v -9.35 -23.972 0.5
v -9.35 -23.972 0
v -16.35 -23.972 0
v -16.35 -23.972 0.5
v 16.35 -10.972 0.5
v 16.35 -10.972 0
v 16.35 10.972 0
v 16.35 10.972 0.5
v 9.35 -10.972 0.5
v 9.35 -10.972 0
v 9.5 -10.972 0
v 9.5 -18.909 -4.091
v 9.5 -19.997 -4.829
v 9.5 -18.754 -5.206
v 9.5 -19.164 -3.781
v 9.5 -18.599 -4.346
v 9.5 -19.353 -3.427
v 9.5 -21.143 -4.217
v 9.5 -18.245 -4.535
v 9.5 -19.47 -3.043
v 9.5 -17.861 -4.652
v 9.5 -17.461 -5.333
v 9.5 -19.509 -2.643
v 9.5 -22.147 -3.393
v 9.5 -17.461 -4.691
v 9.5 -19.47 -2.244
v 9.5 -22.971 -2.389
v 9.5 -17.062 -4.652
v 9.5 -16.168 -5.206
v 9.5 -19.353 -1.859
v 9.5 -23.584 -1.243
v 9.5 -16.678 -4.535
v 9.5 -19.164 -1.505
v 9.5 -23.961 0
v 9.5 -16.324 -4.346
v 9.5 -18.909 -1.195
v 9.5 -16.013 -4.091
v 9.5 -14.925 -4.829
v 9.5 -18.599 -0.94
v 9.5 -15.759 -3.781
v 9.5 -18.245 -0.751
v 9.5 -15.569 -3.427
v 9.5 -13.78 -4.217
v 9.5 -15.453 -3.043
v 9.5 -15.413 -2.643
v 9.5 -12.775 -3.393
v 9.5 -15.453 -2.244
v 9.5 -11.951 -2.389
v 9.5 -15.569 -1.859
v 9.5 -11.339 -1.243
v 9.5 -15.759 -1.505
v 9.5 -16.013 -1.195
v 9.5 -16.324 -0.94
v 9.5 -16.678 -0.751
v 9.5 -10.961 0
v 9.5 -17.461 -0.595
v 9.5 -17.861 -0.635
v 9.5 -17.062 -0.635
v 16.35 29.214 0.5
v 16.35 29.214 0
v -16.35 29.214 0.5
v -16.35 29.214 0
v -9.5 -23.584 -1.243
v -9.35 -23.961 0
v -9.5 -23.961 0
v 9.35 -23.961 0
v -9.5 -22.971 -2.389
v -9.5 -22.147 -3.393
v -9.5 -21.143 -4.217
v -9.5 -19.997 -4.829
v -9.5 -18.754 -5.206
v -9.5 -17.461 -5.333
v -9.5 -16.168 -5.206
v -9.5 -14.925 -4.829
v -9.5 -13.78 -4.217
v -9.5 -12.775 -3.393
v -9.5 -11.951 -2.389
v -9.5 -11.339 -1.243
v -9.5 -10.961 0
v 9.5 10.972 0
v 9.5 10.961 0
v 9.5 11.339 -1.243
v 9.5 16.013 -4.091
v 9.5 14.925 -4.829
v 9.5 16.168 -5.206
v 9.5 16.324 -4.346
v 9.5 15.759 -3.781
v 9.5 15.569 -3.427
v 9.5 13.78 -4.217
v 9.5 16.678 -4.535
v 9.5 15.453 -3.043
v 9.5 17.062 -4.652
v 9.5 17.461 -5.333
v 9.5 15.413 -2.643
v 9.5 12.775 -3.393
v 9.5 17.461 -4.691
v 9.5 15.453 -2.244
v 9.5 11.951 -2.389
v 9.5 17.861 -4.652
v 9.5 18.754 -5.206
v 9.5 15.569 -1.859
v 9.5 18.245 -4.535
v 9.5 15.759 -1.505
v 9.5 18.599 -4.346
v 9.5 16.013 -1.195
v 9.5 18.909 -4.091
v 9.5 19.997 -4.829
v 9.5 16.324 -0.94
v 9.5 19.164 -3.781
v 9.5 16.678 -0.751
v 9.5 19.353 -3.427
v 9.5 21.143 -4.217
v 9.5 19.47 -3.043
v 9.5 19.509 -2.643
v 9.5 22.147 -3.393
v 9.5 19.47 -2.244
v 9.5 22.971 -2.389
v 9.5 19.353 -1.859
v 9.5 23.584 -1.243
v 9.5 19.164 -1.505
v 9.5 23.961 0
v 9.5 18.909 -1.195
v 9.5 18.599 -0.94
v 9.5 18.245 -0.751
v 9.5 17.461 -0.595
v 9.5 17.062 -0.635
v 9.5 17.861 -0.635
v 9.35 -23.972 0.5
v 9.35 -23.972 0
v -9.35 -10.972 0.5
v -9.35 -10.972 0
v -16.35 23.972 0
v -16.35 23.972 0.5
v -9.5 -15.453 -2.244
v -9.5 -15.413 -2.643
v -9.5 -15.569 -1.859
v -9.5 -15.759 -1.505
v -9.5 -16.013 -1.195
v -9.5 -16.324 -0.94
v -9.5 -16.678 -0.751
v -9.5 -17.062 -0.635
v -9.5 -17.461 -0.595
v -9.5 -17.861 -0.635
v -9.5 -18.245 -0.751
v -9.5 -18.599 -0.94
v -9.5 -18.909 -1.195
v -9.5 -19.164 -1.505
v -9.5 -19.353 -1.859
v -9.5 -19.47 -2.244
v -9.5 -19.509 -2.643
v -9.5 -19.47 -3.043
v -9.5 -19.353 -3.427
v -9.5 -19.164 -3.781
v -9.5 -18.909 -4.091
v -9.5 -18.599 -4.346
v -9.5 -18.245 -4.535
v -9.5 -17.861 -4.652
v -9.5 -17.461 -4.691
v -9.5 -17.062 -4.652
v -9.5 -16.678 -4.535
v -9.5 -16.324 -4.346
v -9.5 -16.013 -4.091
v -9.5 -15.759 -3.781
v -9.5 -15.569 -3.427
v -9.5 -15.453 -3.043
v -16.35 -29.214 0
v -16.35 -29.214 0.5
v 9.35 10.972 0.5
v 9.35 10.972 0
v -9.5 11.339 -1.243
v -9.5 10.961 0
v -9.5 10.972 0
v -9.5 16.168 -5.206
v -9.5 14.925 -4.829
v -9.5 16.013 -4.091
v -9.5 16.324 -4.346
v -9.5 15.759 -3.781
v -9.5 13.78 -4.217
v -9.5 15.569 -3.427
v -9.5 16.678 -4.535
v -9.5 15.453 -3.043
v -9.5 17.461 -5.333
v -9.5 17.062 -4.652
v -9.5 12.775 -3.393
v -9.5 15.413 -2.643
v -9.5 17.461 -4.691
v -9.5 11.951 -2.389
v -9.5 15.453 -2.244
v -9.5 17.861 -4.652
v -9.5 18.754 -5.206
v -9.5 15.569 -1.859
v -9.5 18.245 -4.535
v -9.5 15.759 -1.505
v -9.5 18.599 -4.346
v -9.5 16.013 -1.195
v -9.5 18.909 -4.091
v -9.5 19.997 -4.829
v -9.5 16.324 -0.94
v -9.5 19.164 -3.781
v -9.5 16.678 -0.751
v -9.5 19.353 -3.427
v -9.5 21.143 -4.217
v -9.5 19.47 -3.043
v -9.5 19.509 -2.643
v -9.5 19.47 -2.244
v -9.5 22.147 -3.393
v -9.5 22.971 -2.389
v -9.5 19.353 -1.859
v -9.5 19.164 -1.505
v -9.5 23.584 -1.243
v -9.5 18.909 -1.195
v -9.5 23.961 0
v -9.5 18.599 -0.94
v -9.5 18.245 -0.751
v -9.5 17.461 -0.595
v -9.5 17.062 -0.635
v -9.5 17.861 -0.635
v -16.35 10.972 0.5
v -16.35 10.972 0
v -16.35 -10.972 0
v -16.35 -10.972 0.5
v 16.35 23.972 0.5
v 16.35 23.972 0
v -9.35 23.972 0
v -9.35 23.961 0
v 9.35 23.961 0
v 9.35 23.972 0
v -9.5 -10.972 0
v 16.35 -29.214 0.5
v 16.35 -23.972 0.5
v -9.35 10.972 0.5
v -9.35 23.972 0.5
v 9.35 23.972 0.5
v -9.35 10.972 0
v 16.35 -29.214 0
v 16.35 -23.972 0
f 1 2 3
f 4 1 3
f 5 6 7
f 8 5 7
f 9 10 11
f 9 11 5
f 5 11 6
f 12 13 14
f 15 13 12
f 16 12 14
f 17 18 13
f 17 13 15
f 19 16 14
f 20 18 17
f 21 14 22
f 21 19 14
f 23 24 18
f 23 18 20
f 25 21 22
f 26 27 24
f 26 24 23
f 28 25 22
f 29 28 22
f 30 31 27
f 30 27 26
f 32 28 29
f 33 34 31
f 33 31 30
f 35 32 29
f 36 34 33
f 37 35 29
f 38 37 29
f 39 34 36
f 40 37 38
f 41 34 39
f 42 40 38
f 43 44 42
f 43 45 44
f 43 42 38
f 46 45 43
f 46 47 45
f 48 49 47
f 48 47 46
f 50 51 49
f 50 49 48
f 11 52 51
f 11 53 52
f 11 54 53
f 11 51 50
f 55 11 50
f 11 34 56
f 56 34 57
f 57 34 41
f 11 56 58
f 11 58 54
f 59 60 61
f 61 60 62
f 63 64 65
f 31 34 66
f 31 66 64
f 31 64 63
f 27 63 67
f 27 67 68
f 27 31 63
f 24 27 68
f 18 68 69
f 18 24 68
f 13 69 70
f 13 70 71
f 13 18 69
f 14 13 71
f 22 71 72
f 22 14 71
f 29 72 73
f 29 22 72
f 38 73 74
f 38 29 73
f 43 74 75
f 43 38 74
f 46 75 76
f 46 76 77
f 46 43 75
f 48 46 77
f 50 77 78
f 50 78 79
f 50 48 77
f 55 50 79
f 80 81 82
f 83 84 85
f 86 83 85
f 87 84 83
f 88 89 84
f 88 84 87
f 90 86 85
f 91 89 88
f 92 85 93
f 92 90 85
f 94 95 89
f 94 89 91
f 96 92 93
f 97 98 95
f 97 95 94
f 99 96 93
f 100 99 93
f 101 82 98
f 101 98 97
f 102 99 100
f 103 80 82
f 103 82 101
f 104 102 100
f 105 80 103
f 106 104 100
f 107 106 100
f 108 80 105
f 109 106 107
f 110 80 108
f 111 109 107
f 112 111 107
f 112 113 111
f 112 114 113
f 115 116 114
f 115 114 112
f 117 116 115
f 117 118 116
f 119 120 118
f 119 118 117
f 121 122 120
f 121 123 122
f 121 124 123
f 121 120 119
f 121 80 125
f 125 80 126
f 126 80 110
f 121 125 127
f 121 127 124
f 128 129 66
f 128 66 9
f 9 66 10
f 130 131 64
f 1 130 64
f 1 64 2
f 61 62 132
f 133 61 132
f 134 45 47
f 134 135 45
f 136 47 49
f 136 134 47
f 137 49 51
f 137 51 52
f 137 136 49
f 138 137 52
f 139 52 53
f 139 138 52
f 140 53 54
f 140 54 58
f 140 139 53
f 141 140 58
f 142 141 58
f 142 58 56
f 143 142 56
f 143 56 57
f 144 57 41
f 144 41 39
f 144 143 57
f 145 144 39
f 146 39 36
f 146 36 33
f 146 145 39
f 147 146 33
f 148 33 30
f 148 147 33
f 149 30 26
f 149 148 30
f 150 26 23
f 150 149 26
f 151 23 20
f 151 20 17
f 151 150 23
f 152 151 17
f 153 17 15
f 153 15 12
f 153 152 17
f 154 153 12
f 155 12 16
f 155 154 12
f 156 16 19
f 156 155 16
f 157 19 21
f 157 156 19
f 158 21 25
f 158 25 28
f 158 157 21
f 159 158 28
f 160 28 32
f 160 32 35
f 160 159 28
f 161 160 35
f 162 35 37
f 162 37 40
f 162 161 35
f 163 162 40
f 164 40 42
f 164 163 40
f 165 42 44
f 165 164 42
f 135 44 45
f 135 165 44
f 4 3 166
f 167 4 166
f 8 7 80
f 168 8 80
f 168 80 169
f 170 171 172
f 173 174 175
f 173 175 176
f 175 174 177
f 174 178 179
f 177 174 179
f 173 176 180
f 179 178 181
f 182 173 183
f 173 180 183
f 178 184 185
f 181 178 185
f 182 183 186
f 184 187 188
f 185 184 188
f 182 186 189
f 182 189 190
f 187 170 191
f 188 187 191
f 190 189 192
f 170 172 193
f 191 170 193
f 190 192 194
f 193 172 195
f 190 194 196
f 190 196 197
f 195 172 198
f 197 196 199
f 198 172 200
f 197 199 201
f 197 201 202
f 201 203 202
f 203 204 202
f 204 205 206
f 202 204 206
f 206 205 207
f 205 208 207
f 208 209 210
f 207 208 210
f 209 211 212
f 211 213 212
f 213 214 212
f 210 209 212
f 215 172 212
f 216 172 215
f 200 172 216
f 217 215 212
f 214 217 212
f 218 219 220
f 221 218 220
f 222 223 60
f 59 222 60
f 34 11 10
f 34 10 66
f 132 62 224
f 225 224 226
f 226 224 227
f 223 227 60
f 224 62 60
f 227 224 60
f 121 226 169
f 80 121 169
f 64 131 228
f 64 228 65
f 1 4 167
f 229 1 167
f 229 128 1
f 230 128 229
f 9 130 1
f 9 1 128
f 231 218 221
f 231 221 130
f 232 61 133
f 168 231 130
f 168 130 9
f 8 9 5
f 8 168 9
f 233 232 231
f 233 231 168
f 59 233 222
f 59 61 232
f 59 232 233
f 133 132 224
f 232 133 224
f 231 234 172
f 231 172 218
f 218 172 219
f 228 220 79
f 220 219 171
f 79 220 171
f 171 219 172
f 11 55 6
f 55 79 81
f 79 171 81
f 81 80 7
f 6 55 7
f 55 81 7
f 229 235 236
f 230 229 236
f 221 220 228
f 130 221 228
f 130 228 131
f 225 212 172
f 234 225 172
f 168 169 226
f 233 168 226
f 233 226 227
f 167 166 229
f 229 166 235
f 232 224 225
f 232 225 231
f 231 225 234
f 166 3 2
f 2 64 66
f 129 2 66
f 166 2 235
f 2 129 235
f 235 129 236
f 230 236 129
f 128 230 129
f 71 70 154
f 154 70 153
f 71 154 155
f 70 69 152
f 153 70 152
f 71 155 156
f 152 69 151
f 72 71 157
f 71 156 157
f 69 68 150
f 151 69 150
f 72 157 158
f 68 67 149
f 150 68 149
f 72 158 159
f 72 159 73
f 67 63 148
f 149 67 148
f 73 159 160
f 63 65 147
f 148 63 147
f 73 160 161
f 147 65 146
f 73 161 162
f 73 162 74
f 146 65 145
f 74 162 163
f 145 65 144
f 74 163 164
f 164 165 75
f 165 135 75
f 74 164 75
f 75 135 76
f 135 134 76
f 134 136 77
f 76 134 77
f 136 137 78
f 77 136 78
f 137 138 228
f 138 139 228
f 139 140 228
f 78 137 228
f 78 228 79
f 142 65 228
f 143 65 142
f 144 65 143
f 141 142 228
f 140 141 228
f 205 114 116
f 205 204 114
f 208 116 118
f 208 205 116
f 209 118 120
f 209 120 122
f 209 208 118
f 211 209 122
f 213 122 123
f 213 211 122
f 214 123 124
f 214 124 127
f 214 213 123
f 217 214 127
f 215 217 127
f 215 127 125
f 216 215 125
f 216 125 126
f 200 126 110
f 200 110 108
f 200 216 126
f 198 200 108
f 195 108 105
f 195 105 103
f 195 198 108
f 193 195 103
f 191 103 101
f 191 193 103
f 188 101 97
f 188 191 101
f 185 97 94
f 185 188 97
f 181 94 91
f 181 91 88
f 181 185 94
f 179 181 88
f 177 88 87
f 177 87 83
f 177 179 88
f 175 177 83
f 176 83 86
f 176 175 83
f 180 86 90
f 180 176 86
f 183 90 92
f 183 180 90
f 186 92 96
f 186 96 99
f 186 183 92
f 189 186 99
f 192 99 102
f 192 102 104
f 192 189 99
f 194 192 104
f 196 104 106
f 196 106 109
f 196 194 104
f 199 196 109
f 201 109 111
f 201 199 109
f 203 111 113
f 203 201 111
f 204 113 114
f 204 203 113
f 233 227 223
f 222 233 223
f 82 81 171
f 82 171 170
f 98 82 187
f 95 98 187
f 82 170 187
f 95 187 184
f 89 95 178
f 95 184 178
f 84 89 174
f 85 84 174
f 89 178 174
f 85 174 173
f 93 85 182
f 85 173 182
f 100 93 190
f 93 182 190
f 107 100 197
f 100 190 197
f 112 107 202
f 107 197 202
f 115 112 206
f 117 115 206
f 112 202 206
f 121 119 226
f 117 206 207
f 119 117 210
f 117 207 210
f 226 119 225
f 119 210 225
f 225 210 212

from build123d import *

# Parameters (mm, degrees)
F1_DEPTH = 0.5
F2_R     = 2.047791
F3_DEPTH = 9.5


with BuildPart() as f1:
    # F0 (on Top) → F1 (new body)
    with BuildSketch(Plane.XY):
        Polygon((16.35, 29.214), (-16.35, 29.214), (-16.35, 23.9715), (-9.35, 23.9715), (-9.35, 10.9715), (-16.35, 10.9715), (-16.35, 0), (-16.35, -10.9715), (-9.35, -10.9715), (-9.35, -23.9715), (-16.35, -23.9715), (-16.35, -29.214), (16.35, -29.214), (16.35, -23.9715), (9.35, -23.9715), (9.35, -10.9715), (16.35, -10.9715), (16.35, 0), (16.35, 10.9715), (9.35, 10.9715), (9.35, 23.9715), (16.35, 23.9715), align=None)
    extrude(amount=F1_DEPTH)

    # F2 (on Right) → F3 (join, symmetric)
    with BuildSketch(Plane.YZ):
        with BuildLine():
            Line((23.961247, 0), (10.961247, 0))
            ThreePointArc((10.961247, 0), (17.461247, -5.333223), (23.961247, 0))
        make_face()
        with Locations((17.461247, -2.643129)):
            Circle(F2_R, mode=Mode.SUBTRACT)
        with BuildLine():
            ThreePointArc((-23.961247, 0), (-17.461247, -5.333223), (-10.961247, 0))
            Line((-10.961247, 0), (-23.961247, 0))
        make_face()
        with Locations((-17.461247, -2.643129)):
            Circle(F2_R, mode=Mode.SUBTRACT)
    extrude(amount=F3_DEPTH, both=True)


solid = f1.part
